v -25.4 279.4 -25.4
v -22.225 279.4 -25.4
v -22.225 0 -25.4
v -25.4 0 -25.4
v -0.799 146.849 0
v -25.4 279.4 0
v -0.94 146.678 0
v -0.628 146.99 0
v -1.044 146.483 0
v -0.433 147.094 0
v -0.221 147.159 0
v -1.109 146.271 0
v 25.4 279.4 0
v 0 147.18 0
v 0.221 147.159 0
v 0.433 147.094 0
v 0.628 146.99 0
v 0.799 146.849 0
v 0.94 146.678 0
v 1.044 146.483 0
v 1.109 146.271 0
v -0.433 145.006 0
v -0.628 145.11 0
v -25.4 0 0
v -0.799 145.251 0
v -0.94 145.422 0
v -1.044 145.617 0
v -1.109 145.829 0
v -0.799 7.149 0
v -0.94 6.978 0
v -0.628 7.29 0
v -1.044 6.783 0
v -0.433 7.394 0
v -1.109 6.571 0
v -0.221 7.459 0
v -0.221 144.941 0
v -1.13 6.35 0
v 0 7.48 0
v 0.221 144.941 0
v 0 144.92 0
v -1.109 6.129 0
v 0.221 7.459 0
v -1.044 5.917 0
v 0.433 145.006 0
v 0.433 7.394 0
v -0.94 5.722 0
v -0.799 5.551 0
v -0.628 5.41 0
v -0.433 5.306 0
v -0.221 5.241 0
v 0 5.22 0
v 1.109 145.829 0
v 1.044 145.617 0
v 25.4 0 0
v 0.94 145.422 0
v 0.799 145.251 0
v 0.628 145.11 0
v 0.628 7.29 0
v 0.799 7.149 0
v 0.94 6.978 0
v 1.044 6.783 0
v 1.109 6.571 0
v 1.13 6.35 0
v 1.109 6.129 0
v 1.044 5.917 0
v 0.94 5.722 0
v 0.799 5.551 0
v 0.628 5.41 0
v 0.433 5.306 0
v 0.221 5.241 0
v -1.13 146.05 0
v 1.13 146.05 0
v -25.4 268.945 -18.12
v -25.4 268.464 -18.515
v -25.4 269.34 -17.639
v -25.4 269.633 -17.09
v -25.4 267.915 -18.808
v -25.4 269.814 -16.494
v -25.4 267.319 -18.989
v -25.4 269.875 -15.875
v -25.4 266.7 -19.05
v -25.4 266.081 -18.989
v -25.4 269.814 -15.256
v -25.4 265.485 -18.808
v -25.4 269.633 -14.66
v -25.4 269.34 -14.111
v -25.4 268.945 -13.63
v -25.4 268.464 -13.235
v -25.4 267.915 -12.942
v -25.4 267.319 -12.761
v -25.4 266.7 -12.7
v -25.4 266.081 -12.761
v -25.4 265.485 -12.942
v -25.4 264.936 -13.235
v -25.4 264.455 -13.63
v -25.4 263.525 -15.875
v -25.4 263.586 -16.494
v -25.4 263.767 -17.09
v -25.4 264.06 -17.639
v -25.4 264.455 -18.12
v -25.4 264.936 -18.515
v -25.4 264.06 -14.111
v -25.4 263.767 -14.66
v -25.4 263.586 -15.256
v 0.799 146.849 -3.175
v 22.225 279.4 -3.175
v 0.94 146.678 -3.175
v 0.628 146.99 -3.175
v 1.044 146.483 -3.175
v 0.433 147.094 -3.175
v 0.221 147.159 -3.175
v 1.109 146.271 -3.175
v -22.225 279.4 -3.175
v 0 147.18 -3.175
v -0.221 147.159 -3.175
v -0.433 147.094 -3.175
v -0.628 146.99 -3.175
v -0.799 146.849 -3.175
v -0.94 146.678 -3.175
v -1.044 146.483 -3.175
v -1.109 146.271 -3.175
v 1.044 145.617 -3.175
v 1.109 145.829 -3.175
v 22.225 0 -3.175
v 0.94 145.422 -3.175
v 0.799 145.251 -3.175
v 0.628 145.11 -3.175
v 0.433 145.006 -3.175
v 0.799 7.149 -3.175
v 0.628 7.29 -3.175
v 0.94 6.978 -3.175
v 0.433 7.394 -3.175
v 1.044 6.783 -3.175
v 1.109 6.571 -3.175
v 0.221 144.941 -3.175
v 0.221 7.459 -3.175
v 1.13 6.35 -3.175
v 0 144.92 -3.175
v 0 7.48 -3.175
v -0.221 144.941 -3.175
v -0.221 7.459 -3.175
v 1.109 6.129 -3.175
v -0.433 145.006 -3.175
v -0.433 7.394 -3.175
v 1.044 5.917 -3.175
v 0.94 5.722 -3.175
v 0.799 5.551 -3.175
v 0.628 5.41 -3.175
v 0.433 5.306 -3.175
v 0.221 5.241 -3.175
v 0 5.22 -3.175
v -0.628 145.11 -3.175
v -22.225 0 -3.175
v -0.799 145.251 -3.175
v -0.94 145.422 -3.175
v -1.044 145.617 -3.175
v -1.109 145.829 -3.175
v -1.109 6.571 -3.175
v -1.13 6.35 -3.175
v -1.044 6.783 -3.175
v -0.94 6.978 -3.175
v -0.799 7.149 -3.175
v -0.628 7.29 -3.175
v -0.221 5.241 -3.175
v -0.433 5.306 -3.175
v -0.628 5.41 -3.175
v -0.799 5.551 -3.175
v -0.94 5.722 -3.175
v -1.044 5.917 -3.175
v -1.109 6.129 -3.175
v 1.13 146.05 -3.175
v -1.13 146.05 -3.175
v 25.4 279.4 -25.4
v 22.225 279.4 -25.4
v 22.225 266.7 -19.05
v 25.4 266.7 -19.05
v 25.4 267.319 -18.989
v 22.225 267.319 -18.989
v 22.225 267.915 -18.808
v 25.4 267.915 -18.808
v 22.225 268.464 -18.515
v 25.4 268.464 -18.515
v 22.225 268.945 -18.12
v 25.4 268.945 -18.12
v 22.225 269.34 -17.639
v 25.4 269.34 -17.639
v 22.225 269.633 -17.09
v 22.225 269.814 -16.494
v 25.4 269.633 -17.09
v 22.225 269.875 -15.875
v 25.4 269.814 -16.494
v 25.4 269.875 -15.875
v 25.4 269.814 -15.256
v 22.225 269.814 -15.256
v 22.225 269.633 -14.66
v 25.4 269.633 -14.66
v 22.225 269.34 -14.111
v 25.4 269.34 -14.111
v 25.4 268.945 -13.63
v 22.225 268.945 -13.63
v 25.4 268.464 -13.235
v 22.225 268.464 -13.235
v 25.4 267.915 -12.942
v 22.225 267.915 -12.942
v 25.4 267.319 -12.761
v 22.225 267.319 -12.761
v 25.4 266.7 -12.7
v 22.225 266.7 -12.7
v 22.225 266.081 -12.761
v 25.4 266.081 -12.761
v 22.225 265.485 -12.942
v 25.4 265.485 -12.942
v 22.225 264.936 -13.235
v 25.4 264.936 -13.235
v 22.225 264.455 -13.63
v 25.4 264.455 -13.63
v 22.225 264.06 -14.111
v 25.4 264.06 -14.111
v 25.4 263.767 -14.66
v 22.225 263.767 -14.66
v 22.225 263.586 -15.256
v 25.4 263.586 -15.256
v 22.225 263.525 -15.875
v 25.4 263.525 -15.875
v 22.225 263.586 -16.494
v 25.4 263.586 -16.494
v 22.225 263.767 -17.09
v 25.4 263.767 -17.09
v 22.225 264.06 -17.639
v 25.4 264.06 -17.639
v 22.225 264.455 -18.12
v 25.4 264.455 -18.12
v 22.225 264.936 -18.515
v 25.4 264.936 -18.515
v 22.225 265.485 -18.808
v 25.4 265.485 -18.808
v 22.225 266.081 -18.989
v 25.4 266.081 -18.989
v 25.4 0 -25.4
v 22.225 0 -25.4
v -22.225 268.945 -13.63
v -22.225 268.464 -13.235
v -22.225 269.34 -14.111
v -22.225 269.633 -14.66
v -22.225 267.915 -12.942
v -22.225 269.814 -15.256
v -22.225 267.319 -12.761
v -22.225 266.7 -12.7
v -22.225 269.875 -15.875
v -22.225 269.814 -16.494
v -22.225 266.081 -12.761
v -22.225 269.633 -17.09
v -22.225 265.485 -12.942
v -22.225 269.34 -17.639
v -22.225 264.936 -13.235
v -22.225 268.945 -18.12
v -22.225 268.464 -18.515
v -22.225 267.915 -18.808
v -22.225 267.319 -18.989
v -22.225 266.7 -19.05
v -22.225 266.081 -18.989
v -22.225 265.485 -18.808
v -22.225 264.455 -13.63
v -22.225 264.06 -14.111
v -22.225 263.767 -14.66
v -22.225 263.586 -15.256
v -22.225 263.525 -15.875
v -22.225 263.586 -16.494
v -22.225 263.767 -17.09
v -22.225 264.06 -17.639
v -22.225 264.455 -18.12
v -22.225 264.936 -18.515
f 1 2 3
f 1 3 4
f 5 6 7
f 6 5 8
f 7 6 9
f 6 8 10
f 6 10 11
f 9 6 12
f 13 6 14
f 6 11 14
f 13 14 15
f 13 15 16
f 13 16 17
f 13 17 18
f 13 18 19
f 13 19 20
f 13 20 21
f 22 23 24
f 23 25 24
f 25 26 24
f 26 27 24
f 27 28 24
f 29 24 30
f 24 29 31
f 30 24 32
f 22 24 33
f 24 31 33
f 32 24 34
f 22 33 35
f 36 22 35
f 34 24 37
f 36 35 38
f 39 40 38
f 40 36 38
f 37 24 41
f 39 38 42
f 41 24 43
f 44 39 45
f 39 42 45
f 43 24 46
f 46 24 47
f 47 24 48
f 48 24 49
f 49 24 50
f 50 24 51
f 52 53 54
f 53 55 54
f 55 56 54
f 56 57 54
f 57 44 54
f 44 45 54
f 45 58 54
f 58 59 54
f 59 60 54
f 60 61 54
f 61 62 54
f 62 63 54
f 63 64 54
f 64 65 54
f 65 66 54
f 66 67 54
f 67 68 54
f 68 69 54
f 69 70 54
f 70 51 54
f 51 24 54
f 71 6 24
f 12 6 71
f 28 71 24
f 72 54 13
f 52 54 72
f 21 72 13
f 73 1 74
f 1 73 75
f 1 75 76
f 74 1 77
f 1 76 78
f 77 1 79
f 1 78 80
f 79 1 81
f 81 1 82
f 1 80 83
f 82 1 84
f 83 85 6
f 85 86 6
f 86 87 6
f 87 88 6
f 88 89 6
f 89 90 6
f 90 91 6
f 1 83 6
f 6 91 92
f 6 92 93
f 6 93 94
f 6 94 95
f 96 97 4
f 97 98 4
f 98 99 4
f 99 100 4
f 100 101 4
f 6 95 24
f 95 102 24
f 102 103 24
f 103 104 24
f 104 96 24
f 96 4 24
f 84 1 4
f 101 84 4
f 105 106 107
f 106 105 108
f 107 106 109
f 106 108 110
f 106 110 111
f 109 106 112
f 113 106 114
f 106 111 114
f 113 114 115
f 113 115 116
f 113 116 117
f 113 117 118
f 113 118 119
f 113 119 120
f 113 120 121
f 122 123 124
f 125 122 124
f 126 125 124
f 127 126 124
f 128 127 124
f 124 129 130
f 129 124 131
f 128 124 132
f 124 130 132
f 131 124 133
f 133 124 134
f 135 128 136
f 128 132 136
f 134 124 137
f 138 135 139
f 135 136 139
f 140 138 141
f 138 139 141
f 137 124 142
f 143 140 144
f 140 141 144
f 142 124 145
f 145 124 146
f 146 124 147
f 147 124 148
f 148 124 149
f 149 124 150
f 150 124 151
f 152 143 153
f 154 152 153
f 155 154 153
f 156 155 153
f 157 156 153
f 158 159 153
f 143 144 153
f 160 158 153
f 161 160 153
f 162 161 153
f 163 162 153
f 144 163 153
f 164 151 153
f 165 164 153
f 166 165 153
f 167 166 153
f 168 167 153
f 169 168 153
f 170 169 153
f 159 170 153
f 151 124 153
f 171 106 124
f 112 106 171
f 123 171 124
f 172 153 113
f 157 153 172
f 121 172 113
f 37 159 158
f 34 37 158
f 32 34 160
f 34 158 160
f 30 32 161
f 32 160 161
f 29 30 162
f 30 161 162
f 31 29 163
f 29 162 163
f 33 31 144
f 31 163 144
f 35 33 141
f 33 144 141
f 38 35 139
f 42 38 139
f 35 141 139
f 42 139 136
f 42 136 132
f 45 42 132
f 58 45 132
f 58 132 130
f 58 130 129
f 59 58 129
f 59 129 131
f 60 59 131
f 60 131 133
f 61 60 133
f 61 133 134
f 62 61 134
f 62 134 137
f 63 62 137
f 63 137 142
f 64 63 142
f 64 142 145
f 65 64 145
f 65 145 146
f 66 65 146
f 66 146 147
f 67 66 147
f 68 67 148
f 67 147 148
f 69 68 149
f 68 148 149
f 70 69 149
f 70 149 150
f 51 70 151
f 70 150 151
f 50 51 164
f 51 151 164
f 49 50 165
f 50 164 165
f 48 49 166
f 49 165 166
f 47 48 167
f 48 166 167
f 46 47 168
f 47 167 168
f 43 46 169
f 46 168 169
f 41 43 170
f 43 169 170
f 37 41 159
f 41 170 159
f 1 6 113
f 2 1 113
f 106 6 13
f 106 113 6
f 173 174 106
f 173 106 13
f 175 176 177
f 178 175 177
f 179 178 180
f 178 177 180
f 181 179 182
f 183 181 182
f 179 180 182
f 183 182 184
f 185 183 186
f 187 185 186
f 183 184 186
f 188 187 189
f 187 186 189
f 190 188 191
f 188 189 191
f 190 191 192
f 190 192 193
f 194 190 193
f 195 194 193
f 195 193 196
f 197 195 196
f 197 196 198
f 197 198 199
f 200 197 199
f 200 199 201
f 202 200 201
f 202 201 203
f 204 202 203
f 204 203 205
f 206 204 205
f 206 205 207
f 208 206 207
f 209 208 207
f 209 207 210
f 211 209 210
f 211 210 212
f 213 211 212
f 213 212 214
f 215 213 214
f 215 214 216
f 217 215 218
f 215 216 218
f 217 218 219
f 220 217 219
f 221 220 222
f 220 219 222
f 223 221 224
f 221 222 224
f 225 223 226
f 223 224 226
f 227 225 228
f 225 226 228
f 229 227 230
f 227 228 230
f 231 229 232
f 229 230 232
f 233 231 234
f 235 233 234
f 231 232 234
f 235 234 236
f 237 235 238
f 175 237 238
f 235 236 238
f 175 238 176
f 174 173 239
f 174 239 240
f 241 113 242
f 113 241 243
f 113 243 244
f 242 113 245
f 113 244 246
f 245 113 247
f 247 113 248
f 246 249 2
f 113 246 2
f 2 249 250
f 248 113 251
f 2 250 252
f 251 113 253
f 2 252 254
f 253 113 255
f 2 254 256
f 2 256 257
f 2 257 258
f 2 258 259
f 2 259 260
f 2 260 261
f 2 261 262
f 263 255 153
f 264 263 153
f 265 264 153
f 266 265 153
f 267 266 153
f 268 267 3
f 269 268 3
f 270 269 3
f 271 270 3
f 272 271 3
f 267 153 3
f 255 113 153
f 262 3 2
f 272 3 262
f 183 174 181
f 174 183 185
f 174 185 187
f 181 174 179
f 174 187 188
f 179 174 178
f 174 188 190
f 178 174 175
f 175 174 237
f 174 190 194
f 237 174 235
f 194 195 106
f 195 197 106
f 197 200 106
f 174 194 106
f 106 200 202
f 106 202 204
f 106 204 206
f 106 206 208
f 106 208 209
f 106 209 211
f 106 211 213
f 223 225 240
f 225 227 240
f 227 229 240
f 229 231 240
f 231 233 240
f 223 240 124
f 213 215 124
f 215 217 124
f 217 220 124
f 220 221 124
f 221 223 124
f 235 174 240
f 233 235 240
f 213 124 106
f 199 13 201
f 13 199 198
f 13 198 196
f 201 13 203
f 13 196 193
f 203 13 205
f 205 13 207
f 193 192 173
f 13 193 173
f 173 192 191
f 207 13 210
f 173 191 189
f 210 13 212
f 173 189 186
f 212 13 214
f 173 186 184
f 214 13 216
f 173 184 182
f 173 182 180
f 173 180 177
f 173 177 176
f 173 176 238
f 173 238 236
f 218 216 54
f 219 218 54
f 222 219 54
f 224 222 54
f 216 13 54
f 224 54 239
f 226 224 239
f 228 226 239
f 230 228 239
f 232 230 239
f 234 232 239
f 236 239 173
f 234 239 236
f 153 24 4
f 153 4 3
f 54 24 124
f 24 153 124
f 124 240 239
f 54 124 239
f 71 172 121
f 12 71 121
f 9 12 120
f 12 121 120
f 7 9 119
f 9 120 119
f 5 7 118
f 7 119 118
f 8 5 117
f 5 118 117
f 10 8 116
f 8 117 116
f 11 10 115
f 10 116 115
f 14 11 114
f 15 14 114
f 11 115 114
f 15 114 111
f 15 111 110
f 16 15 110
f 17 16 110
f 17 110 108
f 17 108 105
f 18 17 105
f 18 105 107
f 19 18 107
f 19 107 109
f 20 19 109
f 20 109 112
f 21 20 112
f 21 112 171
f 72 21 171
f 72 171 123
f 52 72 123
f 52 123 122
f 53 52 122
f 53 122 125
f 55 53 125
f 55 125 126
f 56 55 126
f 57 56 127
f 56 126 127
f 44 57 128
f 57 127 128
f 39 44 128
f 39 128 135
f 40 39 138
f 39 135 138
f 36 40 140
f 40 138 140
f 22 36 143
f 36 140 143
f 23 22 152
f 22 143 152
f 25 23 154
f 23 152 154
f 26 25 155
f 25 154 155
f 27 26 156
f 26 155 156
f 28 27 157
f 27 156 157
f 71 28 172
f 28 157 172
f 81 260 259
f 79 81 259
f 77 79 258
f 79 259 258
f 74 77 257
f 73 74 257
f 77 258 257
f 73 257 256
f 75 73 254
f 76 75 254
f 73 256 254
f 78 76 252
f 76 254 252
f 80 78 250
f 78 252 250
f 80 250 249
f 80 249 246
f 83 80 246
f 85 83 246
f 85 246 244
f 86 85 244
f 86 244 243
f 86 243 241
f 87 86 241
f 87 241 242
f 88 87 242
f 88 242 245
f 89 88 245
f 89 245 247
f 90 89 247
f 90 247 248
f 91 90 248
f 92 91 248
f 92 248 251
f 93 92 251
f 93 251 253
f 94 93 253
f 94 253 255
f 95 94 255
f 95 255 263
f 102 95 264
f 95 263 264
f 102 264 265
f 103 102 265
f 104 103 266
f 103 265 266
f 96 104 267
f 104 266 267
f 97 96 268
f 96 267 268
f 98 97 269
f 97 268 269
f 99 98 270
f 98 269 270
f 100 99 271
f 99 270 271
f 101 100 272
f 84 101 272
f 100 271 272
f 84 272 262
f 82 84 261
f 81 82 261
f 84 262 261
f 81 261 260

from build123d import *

# Parameters (mm, degrees)
BOSS_EXTRUDE1_DEPTH       = 279.4
SKETCH2_R                 = 3.175
CUT_EXTRUDE1_DEPTH        = 51.8
F_4_40_TAPPED_HOLE1_D     = 2.2606
F_4_40_TAPPED_HOLE1_DEPTH = 3.175


with BuildPart() as part:
    # Sketch1 → Boss-Extrude1 (new body)
    with BuildSketch(Plane(origin=(0, 0, 0), x_dir=(1, 0, 0), z_dir=(0, 1, 0))):
        Polygon((-25.4, 25.4), (-25.4, 0), (25.4, 0), (25.4, 25.4), (22.225, 25.4), (22.225, 3.175), (-22.225, 3.175), (-22.225, 25.4), align=None)
    extrude(amount=BOSS_EXTRUDE1_DEPTH)

    # Sketch2 → Cut-Extrude1 (cut, through all)
    with BuildSketch(Plane(origin=(25.4, 0, 0), x_dir=(0, 0, -1), z_dir=(1, 0, 0))):
        with Locations((15.875, 266.7)):
            Circle(SKETCH2_R)
    extrude(amount=-CUT_EXTRUDE1_DEPTH, mode=Mode.SUBTRACT)

    # #4-40 Tapped Hole1
    with Locations(Plane.XY):
        with Locations((0, 146.05), (0, 6.35)):
            Hole(F_4_40_TAPPED_HOLE1_D / 2, depth=F_4_40_TAPPED_HOLE1_DEPTH)


solid = part.part
